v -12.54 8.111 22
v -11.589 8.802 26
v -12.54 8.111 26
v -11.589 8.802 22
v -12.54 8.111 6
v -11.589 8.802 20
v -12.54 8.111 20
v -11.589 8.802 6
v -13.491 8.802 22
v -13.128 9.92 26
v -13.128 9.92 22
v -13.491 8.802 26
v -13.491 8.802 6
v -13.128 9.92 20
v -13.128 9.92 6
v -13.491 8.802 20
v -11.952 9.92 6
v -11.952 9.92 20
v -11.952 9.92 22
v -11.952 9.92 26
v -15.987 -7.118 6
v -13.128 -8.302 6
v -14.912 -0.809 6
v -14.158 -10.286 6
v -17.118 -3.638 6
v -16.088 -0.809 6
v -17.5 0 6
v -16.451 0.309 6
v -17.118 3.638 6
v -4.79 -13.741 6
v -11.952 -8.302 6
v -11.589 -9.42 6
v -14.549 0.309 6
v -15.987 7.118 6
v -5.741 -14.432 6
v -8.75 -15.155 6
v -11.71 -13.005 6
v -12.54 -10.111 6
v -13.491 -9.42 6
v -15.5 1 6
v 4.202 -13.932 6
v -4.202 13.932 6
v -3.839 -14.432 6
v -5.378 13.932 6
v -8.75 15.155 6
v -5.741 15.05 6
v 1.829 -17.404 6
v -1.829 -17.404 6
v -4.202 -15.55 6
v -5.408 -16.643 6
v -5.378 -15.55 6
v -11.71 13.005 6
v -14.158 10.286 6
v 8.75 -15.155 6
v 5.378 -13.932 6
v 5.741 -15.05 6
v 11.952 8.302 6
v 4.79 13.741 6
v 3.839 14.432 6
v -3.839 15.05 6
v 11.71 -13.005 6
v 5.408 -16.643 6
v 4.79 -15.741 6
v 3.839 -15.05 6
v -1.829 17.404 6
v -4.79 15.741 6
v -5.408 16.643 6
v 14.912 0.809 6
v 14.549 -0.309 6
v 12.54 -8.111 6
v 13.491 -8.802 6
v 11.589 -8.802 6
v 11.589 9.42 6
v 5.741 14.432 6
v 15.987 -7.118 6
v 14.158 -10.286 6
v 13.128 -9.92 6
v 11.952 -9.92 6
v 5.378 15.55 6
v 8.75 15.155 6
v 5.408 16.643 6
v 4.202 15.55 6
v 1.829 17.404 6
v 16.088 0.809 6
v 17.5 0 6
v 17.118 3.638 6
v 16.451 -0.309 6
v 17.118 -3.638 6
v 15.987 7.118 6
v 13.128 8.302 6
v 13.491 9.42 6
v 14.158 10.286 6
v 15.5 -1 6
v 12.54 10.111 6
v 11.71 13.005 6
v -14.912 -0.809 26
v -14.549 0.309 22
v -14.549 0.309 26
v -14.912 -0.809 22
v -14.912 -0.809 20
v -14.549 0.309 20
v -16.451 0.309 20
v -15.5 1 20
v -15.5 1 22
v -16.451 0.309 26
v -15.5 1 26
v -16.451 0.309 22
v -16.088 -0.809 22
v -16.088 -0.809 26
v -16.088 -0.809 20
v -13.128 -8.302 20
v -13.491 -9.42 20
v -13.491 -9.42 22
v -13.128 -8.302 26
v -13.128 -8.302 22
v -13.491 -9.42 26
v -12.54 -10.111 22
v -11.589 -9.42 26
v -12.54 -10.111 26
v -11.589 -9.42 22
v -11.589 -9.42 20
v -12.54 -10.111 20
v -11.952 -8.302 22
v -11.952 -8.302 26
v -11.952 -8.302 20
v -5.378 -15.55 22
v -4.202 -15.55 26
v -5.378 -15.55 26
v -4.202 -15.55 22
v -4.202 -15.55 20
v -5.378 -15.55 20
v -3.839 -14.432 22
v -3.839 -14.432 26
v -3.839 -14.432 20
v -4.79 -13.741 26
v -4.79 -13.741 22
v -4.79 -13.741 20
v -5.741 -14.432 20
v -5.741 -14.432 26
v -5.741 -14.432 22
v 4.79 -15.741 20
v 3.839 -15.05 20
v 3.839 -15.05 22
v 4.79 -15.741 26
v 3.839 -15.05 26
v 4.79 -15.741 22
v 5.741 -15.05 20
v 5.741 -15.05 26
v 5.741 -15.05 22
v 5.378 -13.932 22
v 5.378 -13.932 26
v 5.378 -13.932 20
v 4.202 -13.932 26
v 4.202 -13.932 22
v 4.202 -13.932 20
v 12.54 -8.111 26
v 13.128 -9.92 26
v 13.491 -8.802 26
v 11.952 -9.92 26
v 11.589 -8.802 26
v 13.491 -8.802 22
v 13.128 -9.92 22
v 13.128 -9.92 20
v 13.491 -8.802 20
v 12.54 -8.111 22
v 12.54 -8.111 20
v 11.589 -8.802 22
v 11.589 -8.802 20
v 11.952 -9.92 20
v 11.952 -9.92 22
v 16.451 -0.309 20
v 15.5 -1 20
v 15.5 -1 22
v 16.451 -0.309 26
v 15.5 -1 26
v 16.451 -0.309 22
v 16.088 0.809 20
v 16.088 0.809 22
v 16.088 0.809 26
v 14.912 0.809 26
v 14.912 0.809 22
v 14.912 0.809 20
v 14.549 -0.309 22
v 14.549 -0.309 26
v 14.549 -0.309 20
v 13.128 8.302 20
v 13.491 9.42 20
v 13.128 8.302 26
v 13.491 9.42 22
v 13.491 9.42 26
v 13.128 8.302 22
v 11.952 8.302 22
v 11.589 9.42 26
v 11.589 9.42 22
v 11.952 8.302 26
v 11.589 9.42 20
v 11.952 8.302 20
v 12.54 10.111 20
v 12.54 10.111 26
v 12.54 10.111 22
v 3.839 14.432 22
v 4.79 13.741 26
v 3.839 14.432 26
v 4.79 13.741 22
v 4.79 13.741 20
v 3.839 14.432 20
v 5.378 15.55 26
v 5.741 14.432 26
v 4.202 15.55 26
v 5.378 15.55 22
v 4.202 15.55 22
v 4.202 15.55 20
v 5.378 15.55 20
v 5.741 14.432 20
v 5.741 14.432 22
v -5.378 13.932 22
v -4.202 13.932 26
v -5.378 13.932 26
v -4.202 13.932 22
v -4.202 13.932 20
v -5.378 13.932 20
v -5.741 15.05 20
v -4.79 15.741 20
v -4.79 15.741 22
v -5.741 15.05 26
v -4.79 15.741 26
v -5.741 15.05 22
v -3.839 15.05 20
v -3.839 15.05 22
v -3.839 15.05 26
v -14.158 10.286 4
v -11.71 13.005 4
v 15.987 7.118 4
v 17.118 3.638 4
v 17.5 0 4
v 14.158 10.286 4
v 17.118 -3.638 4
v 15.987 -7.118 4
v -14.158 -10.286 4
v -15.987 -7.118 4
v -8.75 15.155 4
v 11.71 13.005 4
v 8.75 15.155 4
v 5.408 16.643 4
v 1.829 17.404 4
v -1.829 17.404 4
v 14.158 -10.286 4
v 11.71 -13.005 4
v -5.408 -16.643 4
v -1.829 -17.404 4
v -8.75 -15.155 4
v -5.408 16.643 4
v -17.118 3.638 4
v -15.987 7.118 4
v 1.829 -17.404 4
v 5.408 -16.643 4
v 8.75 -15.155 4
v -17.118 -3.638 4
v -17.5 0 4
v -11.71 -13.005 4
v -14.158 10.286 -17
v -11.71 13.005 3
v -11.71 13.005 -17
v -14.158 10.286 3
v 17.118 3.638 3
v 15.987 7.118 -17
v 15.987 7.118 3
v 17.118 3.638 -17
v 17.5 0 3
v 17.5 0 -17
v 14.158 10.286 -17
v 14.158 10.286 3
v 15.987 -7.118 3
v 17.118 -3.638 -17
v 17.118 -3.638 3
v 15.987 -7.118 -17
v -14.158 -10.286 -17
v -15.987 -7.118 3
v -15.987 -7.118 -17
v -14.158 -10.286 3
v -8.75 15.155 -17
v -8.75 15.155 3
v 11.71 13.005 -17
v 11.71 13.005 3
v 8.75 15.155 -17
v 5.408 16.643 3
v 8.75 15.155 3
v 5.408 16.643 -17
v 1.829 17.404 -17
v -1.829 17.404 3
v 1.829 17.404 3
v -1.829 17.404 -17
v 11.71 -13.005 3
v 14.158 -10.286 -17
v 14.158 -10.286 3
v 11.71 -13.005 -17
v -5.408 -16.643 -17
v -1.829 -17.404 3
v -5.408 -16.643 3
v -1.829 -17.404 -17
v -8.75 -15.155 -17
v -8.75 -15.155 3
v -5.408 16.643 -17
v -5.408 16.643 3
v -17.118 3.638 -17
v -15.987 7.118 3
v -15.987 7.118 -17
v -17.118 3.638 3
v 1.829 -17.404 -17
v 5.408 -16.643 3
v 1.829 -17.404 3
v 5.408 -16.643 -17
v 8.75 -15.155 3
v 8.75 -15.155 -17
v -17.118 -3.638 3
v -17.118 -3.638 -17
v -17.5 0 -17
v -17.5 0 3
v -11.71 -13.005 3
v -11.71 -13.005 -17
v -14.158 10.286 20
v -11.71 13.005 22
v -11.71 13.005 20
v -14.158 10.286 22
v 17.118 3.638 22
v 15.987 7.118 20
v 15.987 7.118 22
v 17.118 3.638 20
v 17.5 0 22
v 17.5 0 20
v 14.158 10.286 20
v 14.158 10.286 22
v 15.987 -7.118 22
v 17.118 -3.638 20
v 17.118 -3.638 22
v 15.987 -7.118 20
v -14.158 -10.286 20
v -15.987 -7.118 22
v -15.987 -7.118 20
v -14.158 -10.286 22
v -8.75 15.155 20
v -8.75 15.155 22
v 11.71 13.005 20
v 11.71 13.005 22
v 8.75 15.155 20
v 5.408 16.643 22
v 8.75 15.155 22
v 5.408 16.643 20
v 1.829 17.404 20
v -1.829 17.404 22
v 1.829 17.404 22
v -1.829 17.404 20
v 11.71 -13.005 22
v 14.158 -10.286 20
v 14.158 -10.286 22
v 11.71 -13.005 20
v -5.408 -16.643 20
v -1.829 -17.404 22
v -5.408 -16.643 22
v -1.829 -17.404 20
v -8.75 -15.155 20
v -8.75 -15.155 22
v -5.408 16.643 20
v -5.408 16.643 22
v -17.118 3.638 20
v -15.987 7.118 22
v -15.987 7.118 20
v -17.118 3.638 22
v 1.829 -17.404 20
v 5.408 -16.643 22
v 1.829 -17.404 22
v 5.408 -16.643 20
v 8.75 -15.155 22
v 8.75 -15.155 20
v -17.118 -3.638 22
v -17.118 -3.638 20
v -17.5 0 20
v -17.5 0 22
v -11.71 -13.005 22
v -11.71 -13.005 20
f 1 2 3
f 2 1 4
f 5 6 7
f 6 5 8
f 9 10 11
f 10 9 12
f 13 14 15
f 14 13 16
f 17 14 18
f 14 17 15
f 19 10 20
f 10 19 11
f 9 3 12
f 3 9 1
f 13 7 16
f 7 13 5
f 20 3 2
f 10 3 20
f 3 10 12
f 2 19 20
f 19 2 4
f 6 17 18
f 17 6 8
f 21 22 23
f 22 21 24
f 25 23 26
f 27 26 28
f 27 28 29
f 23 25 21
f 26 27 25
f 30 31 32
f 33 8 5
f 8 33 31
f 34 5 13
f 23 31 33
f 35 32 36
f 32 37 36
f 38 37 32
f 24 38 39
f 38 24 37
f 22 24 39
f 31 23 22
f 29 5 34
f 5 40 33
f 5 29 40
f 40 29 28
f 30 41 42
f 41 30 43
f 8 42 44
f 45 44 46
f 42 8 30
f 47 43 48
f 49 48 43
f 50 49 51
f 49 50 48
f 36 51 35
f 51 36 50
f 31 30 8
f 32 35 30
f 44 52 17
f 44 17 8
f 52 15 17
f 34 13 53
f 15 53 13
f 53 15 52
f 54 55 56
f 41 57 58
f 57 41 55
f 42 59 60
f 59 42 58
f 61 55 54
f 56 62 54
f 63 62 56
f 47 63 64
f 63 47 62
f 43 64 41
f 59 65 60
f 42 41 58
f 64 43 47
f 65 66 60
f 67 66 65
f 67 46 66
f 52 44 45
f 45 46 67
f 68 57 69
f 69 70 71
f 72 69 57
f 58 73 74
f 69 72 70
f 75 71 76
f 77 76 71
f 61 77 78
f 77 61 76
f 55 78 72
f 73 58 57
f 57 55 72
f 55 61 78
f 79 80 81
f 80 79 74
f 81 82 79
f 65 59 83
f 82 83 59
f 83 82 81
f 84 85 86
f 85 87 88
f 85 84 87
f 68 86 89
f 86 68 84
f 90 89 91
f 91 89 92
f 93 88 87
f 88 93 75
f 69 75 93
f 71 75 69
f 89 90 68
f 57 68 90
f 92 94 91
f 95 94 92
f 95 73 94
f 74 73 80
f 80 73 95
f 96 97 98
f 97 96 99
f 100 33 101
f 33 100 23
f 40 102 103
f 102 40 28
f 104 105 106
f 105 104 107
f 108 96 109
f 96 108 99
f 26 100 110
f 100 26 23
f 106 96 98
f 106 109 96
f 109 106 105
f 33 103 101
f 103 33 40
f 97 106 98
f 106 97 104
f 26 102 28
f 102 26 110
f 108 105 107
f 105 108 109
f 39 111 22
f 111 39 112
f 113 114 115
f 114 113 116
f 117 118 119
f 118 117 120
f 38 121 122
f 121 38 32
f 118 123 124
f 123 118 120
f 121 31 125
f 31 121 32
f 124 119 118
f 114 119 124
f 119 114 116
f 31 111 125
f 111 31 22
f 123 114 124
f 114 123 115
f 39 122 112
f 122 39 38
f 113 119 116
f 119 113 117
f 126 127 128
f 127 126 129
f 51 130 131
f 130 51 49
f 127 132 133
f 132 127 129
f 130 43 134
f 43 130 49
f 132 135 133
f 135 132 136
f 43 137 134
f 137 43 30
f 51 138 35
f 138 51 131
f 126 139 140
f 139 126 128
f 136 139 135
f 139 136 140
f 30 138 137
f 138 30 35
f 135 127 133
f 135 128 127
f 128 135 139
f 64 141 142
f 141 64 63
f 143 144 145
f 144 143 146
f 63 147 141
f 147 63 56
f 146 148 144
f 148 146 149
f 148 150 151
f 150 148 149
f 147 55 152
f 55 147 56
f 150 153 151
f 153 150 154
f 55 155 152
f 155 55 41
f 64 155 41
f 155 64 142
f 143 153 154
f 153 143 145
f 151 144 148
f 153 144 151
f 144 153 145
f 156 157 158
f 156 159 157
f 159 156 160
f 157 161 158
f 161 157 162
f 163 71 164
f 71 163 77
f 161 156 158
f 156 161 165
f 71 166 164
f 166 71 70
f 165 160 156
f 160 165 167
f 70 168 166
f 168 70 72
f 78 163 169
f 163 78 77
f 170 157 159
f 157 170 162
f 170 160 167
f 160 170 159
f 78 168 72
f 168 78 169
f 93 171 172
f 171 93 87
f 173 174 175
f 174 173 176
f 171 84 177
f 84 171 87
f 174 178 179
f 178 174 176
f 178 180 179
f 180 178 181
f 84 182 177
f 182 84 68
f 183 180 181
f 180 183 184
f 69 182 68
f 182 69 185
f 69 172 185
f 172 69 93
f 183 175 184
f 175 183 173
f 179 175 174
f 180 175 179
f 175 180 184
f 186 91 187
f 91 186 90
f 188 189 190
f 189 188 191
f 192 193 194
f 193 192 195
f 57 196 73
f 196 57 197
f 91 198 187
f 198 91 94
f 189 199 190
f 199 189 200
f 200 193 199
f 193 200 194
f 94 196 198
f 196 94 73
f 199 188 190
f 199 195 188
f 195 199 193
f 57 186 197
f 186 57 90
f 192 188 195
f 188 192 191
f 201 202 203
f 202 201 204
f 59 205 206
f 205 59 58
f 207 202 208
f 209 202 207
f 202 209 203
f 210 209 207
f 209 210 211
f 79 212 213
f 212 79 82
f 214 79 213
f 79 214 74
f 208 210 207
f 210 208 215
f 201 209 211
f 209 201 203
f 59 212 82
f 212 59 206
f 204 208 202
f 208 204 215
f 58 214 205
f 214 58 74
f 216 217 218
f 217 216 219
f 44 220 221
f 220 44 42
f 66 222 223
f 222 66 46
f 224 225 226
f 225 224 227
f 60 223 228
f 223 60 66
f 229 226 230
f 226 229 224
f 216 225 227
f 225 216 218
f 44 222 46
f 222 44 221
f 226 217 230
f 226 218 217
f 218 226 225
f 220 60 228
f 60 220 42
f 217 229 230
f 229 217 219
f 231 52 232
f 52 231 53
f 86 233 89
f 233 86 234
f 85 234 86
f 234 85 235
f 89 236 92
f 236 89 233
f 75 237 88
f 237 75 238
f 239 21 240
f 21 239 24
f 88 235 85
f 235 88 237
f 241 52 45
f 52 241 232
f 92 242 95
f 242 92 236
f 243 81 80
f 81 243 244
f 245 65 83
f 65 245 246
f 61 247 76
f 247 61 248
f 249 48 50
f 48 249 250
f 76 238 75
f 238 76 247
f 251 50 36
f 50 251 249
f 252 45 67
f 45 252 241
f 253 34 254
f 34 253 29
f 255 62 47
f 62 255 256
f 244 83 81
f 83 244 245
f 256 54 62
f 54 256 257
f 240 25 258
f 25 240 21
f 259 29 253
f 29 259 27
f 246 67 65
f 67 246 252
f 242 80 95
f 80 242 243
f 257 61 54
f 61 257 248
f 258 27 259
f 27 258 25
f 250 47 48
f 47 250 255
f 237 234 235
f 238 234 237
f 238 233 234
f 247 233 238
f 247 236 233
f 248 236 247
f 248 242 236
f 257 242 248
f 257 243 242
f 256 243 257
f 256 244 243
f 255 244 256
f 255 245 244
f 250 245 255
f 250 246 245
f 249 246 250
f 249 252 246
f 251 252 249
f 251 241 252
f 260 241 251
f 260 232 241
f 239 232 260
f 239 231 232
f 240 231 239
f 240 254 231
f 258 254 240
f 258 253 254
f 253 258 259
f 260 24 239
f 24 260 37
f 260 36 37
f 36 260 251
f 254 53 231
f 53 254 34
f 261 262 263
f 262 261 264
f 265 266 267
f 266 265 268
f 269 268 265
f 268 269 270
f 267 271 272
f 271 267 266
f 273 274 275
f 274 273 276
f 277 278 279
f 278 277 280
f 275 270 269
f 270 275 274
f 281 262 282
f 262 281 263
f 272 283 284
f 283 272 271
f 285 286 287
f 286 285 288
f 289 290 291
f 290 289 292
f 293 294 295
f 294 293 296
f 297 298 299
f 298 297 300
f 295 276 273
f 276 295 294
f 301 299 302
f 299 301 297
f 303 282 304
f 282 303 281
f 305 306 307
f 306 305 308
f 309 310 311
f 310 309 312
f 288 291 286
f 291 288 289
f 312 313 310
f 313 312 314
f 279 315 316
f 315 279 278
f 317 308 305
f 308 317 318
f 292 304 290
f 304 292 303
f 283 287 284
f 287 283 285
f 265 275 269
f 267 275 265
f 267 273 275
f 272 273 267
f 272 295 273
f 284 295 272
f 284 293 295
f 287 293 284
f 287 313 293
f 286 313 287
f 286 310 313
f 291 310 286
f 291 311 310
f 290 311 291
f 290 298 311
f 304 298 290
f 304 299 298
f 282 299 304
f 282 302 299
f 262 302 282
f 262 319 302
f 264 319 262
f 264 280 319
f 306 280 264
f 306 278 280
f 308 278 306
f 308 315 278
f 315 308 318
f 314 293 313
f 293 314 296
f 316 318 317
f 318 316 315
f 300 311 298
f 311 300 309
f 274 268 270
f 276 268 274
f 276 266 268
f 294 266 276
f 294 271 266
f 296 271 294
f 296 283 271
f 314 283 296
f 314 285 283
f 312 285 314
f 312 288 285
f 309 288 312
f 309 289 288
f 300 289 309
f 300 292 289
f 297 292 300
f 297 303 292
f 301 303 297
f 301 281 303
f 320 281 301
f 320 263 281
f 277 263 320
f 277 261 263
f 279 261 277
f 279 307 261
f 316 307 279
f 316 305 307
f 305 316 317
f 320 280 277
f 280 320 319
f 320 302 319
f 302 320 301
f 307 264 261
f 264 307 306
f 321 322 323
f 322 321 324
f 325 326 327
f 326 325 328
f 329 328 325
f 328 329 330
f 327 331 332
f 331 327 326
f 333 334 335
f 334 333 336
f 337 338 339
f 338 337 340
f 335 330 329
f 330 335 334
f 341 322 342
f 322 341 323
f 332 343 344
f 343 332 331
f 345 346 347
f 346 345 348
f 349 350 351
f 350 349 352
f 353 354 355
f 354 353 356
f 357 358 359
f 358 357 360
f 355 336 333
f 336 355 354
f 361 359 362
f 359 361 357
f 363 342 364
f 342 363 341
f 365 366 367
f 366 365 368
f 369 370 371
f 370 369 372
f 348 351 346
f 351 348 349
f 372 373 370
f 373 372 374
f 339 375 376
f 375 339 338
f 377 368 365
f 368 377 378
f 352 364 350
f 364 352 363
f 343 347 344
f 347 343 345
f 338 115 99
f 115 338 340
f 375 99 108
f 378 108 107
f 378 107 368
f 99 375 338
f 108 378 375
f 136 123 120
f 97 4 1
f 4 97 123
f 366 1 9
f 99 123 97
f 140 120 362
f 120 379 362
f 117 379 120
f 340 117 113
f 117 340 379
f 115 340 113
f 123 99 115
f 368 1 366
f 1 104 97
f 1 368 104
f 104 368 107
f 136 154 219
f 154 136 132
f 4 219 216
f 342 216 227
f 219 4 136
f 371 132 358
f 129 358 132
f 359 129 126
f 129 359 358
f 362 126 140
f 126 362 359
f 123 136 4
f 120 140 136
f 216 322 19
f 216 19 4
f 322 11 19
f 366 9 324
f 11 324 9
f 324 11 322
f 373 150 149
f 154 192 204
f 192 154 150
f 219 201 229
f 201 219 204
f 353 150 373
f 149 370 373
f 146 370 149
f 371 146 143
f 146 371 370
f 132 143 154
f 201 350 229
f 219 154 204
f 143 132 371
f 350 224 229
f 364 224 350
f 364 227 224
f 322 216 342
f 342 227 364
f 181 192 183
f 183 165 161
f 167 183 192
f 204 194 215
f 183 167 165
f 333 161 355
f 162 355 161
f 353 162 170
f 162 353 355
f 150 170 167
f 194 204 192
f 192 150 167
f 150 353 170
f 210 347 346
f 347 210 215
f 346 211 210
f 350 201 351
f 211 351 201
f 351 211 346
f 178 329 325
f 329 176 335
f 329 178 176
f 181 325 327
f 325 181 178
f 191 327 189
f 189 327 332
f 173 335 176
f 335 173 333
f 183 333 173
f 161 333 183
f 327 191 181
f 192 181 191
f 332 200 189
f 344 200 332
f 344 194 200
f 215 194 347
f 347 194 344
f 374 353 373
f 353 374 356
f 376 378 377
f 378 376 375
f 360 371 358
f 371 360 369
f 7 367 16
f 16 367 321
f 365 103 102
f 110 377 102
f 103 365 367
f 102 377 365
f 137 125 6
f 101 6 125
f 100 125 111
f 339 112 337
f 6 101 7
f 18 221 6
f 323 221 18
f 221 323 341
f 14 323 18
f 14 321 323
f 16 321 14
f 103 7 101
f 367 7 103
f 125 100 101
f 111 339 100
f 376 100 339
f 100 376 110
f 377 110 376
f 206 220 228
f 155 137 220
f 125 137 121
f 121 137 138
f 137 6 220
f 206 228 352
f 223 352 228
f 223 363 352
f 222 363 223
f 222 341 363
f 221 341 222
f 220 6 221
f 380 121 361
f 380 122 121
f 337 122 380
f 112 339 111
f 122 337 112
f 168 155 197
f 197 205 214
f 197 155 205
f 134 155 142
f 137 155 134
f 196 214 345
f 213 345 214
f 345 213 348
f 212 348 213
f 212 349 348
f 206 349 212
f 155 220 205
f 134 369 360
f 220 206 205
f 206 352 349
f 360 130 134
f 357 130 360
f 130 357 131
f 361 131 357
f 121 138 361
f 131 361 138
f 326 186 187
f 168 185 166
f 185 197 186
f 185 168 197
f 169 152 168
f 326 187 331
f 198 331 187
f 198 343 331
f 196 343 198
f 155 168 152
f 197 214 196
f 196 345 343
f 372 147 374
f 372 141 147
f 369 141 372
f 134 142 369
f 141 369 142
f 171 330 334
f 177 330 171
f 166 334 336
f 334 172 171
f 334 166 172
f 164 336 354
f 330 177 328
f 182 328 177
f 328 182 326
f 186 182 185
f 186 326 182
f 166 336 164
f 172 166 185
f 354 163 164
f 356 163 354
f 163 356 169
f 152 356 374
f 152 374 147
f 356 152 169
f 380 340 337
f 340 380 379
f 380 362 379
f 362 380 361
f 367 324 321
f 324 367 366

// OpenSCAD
bottle_width = 5;
bottle_count = 10;

radius = 17.5;
dispenser_radius = 3;


translate([0,0,4])
cylinder(h = 2, r=radius);

translate([0,0,-17])
cylinder(h = 20, r=radius);

translate([0,0,20])
cylinder(h = 2, r=radius);

for ( i = [1 : bottle_count] )
{
    rotate( i * 360 / bottle_count+180/bottle_count, [0, 0, 1])
    translate([0, radius-2, 6])
	 cylinder(h = 20, r=1);

}

%for ( i = [1 : bottle_count] )
{
    rotate( i * 360 / bottle_count, [0, 0, 1])
    translate([0, radius+bottle_width, 14])
	 cylinder(h = 20, r=bottle_width);

}


%for ( i = [1 : bottle_count] )
{
    rotate( i * 360 / bottle_count, [0, 0, 1])
    translate([0, radius+bottle_width, 6])
	 cylinder(h=4, r=dispenser_radius);
}
